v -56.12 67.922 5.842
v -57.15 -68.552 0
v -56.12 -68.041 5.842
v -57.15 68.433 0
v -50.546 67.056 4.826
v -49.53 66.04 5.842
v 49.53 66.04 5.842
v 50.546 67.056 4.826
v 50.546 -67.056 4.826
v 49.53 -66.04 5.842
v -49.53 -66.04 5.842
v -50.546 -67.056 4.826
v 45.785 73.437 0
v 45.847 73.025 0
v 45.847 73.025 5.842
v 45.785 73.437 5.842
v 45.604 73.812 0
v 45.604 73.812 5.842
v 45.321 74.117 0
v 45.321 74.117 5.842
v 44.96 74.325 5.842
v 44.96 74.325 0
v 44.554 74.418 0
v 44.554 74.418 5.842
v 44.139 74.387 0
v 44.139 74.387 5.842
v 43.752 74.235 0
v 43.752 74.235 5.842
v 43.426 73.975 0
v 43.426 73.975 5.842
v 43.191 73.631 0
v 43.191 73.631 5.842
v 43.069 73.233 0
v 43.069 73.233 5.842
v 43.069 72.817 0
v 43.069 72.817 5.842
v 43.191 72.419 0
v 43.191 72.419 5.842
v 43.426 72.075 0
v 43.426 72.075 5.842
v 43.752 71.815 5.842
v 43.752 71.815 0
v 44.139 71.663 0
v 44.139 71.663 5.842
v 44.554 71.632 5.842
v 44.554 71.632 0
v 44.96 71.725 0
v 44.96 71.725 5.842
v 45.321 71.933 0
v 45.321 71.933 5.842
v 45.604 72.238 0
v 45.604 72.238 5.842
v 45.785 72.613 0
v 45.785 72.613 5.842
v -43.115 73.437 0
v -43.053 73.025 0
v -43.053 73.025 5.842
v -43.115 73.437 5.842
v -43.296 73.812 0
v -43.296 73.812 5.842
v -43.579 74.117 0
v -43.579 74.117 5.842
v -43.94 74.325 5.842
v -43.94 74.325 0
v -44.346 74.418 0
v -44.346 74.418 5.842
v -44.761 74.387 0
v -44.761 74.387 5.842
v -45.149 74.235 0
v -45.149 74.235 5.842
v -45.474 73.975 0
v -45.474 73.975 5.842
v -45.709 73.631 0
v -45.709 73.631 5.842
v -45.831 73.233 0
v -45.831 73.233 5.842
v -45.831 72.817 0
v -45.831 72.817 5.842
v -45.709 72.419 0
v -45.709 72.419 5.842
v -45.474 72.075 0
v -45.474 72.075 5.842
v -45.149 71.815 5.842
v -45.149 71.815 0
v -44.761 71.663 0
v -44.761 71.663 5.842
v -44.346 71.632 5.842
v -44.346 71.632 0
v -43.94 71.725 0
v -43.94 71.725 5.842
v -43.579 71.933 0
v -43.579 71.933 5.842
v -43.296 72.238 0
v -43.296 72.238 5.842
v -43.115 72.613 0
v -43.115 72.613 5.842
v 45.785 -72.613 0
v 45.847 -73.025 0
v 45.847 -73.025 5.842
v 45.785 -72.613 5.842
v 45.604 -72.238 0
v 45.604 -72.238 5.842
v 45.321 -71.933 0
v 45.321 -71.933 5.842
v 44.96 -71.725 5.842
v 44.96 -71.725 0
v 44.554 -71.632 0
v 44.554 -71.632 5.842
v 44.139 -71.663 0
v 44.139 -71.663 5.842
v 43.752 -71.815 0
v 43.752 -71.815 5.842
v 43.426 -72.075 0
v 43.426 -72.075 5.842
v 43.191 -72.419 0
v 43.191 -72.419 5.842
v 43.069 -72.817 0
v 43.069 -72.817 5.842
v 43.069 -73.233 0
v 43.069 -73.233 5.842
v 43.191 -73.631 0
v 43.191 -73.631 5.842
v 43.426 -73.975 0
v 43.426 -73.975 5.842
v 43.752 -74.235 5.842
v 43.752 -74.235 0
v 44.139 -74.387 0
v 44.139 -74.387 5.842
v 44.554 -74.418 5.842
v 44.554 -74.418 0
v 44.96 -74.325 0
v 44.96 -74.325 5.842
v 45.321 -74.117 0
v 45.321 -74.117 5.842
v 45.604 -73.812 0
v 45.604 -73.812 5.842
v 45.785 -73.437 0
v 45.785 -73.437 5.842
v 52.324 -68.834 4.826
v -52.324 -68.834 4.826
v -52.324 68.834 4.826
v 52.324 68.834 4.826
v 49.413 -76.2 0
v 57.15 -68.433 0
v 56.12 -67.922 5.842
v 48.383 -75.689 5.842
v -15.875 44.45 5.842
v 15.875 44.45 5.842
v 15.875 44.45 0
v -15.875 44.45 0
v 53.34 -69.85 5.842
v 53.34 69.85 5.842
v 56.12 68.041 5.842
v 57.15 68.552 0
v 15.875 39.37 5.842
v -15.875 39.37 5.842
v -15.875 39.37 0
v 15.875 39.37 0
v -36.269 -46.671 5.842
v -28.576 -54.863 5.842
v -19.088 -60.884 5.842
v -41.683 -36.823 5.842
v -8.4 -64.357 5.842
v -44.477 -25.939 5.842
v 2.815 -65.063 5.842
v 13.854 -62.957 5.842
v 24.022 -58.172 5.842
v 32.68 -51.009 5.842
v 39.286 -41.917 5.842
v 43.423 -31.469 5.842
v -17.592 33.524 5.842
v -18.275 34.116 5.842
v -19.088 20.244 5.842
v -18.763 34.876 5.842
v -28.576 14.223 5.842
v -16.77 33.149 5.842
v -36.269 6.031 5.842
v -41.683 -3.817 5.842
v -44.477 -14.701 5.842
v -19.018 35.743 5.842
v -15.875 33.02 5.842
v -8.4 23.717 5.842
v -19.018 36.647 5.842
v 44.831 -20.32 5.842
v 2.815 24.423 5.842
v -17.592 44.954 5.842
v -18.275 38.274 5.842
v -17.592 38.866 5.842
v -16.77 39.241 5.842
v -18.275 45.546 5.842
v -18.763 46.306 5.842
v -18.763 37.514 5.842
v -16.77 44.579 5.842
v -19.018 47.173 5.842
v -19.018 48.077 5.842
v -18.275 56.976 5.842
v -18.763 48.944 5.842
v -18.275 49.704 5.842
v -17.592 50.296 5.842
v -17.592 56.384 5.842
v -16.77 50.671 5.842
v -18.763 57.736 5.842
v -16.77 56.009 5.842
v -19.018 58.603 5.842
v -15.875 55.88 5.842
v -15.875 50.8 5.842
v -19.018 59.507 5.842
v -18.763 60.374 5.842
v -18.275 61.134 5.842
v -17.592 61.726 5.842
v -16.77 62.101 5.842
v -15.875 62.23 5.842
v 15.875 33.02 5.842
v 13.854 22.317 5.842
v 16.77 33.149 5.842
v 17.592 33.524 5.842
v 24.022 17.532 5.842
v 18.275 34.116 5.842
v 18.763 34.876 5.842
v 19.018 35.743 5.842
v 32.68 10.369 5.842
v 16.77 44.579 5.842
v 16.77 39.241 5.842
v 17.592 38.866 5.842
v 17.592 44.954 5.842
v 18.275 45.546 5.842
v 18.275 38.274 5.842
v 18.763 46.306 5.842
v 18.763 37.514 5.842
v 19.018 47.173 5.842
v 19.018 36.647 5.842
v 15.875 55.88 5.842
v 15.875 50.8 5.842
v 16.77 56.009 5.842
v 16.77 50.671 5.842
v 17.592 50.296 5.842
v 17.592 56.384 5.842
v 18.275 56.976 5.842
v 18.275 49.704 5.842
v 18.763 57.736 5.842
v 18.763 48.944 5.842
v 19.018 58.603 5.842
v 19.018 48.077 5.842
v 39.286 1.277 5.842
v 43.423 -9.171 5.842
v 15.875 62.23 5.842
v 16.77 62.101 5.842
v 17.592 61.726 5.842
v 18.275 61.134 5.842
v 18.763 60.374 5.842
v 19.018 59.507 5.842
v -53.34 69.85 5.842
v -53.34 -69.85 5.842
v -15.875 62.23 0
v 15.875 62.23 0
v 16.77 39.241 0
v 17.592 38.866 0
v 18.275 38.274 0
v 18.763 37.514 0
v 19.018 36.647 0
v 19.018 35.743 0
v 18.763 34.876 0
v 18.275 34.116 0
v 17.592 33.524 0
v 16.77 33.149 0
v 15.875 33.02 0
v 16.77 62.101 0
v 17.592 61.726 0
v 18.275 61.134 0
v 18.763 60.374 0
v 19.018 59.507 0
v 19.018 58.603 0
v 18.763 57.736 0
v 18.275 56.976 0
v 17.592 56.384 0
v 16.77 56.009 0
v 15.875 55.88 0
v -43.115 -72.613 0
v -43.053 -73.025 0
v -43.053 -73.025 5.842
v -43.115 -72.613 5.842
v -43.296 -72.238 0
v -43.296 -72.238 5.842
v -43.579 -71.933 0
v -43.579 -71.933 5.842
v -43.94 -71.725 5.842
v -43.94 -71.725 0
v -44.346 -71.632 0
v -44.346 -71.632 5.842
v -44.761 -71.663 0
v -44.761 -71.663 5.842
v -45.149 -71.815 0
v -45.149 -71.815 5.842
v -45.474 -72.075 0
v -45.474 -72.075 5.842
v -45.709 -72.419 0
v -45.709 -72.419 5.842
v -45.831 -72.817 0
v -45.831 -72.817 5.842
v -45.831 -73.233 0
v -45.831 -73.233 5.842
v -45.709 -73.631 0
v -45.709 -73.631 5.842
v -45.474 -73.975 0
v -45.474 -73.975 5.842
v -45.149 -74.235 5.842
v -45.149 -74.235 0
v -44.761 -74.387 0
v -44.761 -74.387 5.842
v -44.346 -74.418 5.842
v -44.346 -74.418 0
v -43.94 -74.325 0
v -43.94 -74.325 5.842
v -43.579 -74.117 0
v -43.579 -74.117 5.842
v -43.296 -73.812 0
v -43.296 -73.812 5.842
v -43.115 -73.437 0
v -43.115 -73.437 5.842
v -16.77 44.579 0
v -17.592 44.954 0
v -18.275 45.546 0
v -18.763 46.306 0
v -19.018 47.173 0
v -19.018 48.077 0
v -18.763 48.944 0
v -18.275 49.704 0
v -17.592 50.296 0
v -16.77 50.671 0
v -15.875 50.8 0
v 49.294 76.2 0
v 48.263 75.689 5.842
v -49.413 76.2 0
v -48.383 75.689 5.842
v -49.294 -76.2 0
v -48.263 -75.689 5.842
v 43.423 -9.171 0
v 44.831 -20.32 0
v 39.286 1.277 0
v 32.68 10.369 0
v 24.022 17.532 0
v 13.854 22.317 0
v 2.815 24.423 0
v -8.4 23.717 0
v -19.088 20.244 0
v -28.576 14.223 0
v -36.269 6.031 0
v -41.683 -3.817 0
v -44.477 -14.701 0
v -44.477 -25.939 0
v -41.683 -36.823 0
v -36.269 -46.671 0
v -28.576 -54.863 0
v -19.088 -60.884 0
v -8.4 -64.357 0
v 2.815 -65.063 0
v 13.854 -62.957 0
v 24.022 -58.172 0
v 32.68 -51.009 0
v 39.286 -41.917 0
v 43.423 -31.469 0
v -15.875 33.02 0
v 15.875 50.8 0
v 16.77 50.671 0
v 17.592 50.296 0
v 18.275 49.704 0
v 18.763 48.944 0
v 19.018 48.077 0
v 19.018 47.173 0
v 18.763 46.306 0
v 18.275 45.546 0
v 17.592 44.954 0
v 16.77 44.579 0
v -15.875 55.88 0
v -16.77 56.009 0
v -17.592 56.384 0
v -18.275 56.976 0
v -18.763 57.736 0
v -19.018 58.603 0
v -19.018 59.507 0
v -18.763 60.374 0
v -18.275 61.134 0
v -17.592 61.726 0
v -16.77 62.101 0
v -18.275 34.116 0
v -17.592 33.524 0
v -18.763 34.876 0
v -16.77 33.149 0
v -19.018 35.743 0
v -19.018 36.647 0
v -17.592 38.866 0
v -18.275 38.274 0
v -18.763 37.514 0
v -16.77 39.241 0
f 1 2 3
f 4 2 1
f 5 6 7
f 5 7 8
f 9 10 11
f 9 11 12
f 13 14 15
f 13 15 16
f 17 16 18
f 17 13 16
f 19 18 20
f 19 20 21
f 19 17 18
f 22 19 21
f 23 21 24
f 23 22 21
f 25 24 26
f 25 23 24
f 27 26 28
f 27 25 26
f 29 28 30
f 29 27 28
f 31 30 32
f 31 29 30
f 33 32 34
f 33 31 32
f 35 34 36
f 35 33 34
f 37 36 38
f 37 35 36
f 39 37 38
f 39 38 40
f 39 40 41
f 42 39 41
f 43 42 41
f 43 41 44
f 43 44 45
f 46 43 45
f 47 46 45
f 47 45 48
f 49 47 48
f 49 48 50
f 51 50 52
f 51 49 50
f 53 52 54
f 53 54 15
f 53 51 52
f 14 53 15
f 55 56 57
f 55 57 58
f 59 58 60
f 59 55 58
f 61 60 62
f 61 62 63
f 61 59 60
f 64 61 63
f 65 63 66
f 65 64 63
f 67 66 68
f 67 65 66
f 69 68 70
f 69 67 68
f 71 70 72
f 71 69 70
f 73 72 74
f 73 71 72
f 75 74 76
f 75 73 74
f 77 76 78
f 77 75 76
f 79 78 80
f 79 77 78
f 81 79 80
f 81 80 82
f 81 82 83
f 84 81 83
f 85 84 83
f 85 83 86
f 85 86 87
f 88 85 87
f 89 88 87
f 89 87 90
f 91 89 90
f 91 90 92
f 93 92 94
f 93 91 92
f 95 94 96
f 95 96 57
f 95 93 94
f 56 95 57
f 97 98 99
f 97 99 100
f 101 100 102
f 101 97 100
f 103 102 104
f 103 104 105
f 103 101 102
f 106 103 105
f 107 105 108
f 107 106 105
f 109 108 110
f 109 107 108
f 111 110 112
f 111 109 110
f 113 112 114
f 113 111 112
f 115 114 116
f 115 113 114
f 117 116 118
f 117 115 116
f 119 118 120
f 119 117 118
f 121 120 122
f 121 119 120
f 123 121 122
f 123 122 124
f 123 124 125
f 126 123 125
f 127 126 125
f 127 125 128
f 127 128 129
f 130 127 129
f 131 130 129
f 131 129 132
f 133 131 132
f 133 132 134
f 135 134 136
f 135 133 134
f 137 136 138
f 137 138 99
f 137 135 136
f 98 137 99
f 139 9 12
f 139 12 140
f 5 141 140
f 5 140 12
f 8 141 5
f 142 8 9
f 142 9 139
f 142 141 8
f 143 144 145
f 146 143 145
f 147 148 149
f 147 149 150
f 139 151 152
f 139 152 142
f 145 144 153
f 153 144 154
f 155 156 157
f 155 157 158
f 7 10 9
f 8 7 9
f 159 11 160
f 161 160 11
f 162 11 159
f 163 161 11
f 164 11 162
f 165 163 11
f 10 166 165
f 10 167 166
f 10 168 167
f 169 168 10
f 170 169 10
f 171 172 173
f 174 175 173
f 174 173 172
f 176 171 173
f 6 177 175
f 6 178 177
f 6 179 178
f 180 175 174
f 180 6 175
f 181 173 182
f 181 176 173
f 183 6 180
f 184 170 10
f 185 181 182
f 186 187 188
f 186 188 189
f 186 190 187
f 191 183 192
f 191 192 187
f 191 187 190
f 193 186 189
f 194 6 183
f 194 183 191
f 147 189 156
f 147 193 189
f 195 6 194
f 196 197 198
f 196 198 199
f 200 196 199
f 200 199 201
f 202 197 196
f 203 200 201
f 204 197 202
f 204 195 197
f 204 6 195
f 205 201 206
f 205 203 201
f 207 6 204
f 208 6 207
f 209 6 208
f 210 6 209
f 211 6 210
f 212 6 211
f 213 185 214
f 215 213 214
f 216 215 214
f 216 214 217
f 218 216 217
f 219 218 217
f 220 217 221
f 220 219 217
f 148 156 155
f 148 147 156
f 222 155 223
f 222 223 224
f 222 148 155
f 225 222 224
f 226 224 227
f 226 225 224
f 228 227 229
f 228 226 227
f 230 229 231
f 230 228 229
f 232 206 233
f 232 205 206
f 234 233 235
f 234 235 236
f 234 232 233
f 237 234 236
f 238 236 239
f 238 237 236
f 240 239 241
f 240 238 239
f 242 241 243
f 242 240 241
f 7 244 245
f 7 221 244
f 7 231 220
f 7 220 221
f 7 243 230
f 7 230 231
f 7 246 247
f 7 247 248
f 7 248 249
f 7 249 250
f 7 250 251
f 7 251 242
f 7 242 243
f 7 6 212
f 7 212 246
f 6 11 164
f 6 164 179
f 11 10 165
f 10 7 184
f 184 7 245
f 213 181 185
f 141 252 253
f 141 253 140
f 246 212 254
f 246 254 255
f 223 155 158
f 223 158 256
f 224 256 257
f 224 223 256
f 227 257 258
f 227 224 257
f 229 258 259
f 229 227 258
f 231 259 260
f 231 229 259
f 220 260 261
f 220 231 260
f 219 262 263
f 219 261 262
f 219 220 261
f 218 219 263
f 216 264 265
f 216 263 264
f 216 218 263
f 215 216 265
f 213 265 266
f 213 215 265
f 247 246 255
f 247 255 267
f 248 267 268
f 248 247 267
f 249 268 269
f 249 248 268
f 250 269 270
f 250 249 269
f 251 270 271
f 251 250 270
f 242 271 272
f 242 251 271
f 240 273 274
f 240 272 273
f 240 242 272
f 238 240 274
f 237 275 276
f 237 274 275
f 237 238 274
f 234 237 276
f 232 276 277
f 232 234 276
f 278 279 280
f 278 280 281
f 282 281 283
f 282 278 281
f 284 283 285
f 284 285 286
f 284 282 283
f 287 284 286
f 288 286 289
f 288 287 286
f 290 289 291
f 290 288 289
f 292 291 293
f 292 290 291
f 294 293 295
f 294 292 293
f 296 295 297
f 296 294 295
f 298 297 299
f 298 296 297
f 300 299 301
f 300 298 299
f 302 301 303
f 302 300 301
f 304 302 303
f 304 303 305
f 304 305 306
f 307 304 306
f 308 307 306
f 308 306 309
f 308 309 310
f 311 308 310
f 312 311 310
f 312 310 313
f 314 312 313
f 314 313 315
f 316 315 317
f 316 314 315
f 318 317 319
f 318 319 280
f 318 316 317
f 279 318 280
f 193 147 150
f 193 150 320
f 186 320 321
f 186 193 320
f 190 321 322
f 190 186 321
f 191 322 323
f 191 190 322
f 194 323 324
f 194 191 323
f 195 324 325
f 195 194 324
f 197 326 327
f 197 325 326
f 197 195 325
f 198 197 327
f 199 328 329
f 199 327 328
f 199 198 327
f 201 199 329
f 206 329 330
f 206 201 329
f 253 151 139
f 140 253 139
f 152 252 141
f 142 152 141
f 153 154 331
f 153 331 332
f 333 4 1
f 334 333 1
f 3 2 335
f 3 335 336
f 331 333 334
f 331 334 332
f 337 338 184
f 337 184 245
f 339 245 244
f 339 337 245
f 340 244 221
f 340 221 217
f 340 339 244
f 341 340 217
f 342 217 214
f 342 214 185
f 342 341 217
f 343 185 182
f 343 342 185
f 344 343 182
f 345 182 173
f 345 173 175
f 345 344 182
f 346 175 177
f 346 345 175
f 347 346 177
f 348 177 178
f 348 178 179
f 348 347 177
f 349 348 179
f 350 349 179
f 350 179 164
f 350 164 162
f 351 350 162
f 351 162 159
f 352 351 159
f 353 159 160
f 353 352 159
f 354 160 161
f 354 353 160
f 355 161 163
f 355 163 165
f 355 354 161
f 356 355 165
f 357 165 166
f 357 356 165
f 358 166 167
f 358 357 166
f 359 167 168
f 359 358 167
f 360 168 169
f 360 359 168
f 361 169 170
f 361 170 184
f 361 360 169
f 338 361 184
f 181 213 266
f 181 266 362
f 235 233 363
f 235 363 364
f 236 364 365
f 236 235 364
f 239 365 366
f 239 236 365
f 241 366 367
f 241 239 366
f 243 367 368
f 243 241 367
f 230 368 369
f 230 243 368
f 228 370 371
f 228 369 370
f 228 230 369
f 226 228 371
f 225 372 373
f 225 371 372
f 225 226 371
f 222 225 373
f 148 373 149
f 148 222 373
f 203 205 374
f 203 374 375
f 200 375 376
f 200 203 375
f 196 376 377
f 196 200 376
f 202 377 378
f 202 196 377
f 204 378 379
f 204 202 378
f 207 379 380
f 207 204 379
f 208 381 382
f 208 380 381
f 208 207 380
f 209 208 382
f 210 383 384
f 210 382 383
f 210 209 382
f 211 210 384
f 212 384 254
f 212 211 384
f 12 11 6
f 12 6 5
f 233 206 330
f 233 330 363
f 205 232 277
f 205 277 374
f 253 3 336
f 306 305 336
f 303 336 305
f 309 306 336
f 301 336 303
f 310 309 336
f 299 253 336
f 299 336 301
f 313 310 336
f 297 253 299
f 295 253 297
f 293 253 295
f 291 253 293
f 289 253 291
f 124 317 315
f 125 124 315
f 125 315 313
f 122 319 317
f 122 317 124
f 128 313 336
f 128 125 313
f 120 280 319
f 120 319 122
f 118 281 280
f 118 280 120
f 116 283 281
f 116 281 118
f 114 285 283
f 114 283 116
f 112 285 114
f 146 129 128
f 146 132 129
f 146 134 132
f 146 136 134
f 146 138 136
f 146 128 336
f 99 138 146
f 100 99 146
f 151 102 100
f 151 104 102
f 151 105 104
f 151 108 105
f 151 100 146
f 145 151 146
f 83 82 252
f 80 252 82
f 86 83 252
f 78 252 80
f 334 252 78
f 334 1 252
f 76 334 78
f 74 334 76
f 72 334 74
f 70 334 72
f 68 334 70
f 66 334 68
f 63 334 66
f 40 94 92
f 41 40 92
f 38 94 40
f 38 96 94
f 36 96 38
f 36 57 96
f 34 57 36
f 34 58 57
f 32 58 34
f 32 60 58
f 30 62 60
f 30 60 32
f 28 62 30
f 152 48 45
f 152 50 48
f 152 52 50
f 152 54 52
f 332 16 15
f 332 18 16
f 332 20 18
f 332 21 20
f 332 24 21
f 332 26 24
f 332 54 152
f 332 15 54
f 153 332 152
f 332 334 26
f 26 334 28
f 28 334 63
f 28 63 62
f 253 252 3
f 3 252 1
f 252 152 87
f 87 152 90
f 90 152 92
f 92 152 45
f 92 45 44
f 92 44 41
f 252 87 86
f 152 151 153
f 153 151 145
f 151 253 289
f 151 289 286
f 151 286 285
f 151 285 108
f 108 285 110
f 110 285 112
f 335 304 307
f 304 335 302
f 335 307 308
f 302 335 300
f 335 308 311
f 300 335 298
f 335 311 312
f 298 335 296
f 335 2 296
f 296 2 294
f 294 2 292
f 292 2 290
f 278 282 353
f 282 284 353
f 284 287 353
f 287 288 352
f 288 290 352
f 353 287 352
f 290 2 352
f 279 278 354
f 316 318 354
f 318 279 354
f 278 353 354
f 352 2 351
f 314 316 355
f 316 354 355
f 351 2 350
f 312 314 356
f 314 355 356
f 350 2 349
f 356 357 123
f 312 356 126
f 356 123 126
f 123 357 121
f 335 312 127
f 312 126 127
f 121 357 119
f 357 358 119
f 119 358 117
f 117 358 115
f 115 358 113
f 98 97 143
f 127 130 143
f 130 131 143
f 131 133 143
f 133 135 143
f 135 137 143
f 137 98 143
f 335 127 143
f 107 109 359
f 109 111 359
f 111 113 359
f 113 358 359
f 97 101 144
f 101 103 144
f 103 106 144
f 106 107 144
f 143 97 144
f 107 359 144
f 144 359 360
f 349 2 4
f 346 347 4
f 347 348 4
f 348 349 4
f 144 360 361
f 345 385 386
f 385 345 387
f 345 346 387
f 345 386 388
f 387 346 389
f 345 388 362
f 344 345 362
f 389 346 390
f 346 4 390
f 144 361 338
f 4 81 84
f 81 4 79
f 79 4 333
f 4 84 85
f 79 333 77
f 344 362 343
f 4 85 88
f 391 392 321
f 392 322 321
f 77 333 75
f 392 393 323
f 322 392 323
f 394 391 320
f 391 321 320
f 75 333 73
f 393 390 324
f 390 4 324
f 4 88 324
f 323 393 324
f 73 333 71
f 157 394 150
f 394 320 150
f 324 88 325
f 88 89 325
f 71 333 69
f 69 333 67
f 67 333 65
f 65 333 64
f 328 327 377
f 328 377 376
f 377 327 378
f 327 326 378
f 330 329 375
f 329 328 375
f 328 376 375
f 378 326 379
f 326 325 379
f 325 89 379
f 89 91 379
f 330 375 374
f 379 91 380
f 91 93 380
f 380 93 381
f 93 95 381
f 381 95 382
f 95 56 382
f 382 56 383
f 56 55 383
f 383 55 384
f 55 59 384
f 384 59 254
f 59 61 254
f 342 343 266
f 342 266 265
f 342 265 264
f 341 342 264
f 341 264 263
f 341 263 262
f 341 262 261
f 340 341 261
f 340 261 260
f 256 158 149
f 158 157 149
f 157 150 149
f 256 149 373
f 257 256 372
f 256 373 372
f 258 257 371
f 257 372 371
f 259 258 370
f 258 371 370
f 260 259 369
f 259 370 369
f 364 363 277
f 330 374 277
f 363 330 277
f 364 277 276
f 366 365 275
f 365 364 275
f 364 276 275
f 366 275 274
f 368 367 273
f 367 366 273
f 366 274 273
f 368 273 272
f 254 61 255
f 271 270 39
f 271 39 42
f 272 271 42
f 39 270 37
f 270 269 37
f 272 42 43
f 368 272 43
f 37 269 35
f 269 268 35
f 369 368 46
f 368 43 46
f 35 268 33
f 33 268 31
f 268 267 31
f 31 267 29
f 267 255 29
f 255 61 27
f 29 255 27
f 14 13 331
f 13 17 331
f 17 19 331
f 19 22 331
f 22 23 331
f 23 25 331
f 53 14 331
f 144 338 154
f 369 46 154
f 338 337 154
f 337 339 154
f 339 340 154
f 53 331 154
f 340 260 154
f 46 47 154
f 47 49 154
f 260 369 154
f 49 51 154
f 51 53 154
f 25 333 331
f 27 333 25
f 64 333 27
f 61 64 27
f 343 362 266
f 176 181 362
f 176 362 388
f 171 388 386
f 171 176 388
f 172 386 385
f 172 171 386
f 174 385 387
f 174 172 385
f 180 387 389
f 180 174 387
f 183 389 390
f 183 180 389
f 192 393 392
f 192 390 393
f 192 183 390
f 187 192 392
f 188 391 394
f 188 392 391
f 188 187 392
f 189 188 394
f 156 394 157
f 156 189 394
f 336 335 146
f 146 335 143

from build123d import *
from OCP.BRepFilletAPI import BRepFilletAPI_MakeChamfer

# Parameters (mm, degrees)
SKETCH1_W               = 114.3
SKETCH1_H               = 152.4
SKETCH1_R               = 44.831
SKETCH1_R_2             = 1.397
BOSS_EXTRUDE1_DEPTH     = 5.842
DRAFT1_ANGLE            = -5
DRAFT2_ANGLE            = -10
SKETCH2_W               = 104.14
SKETCH2_H               = 137.16
SKETCH2_W_2             = 101.6
SKETCH2_H_2             = 134.62
CUT_EXTRUDE_THIN1_DEPTH = 1.016
CHAMFER2_SIZE           = 7.62
CHAMFER2_SIZE2          = 7.737996461
CUT_EXTRUDE1_DEPTH      = 7.62


with BuildPart() as part:
    # Sketch1 → Boss-Extrude1 (new body)
    with BuildSketch(Plane.XY):
        Rectangle(SKETCH1_W, SKETCH1_H)
        with Locations((0, -20.32)):
            Circle(SKETCH1_R, mode=Mode.SUBTRACT)
        with Locations((-44.45, 73.025)):
            Circle(SKETCH1_R_2, mode=Mode.SUBTRACT)
        with Locations((44.45, 73.025)):
            Circle(SKETCH1_R_2, mode=Mode.SUBTRACT)
        with Locations((44.45, -73.025)):
            Circle(SKETCH1_R_2, mode=Mode.SUBTRACT)
        with Locations((-44.45, -73.025)):
            Circle(SKETCH1_R_2, mode=Mode.SUBTRACT)
    extrude(amount=BOSS_EXTRUDE1_DEPTH)

    # Draft1
    draft1_faces = [part.faces().sort_by_distance(p)[0] for p in [
        (0, 76.2, 2.921),
        (0, -76.2, 2.921),
    ]]
    draft(draft1_faces, Plane(origin=(0, 0, 0), x_dir=(-1, 0, 0), z_dir=(0, 0, -1)), DRAFT1_ANGLE)

    # Draft2
    draft2_faces = [part.faces().sort_by_distance(p)[0] for p in [
        (57.15, 0, 2.917723595),
        (-57.15, 0, 2.917723595),
    ]]
    draft(draft2_faces, Plane(origin=(0, 0, 0), x_dir=(-1, 0, 0), z_dir=(0, 0, -1)), DRAFT2_ANGLE)

    # Sketch2 → Cut-Extrude-Thin1 (cut)
    with BuildSketch(Plane.XY.offset(5.842)):
        Rectangle(SKETCH2_W, SKETCH2_H)
        Rectangle(SKETCH2_W_2, SKETCH2_H_2, mode=Mode.SUBTRACT)
    extrude(amount=-CUT_EXTRUDE_THIN1_DEPTH, mode=Mode.SUBTRACT)

    # Chamfer1
    # the kernel refuses this chamfer: 1.27 mm, written as the material it takes off along each edge
    with BuildSketch(Plane(origin=(50.8, 67.31, 5.842), x_dir=(-0.9996219169112968, 0, 0.02749587661058659), z_dir=(0, -1, 0))) as chamfer1_piece_1_section:
        with BuildLine():
            Line((1.306414958, 0), (-0.071814887, 1.304439598))
            Line((-0.071814887, 1.304439598), (-0.097205283, 1.303741203))
            ThreePointArc((-0.097205283, 1.303741203), (-0.043344118, 0.652015244), (-0.025390397, -0.000698395))
            Line((-0.025390397, -0.000698395), (0.000698395, -0.025390397))
            ThreePointArc((0.000698395, -0.025390397), (0.653412034, -0.007436675), (1.307113353, -0.025390397))
            Line((1.307113353, -0.025390397), (1.306414958, 0))
        make_face()
    chamfer1_piece_1 = extrude(amount=134.62, mode=Mode.PRIVATE)
    chamfer1_piece_1 = split(chamfer1_piece_1, bisect_by=Plane(origin=(50.360937616, 0, 4.826), z_dir=(0, 0, 1)), keep=Keep.TOP, mode=Mode.PRIVATE)
    add(chamfer1_piece_1, mode=Mode.SUBTRACT)
    with BuildSketch(Plane(origin=(50.8, -67.31, 5.842), x_dir=(0, 0.9996219169112968, 0.02749587661058659), z_dir=(-1, 0, 0))) as chamfer1_piece_2_section:
        with BuildLine():
            Line((1.306414958, 0), (-0.071814887, 1.304439598))
            Line((-0.071814887, 1.304439598), (-0.097205283, 1.303741203))
            ThreePointArc((-0.097205283, 1.303741203), (-0.043344118, 0.652015244), (-0.025390397, -0.000698395))
            Line((-0.025390397, -0.000698395), (0.000698395, -0.025390397))
            ThreePointArc((0.000698395, -0.025390397), (0.653412034, -0.007436675), (1.307113353, -0.025390397))
            Line((1.307113353, -0.025390397), (1.306414958, 0))
        make_face()
    chamfer1_piece_2 = extrude(amount=101.6, mode=Mode.PRIVATE)
    chamfer1_piece_2 = split(chamfer1_piece_2, bisect_by=Plane(origin=(0, -66.870937616, 4.826), z_dir=(0, 0, 1)), keep=Keep.TOP, mode=Mode.PRIVATE)
    add(chamfer1_piece_2, mode=Mode.SUBTRACT)
    with BuildSketch(Plane(origin=(-50.8, -67.31, 5.842), x_dir=(0.9996219169112968, 0, 0.02749587661058659), z_dir=(0, 1, 0))) as chamfer1_piece_3_section:
        with BuildLine():
            Line((1.306414958, 0), (-0.071814887, 1.304439598))
            Line((-0.071814887, 1.304439598), (-0.097205283, 1.303741203))
            ThreePointArc((-0.097205283, 1.303741203), (-0.043344118, 0.652015244), (-0.025390397, -0.000698395))
            Line((-0.025390397, -0.000698395), (0.000698395, -0.025390397))
            ThreePointArc((0.000698395, -0.025390397), (0.653412034, -0.007436675), (1.307113353, -0.025390397))
            Line((1.307113353, -0.025390397), (1.306414958, 0))
        make_face()
    chamfer1_piece_3 = extrude(amount=134.62, mode=Mode.PRIVATE)
    chamfer1_piece_3 = split(chamfer1_piece_3, bisect_by=Plane(origin=(-50.360937616, 0, 4.826), z_dir=(0, 0, 1)), keep=Keep.TOP, mode=Mode.PRIVATE)
    add(chamfer1_piece_3, mode=Mode.SUBTRACT)
    with BuildSketch(Plane(origin=(-50.8, 67.31, 5.842), x_dir=(0, -0.9996219169112968, 0.02749587661058659), z_dir=(1, 0, 0))) as chamfer1_piece_4_section:
        with BuildLine():
            Line((1.306414958, 0), (-0.071814887, 1.304439598))
            Line((-0.071814887, 1.304439598), (-0.097205283, 1.303741203))
            ThreePointArc((-0.097205283, 1.303741203), (-0.043344118, 0.652015244), (-0.025390397, -0.000698395))
            Line((-0.025390397, -0.000698395), (0.000698395, -0.025390397))
            ThreePointArc((0.000698395, -0.025390397), (0.653412034, -0.007436675), (1.307113353, -0.025390397))
            Line((1.307113353, -0.025390397), (1.306414958, 0))
        make_face()
    chamfer1_piece_4 = extrude(amount=101.6, mode=Mode.PRIVATE)
    chamfer1_piece_4 = split(chamfer1_piece_4, bisect_by=Plane(origin=(0, 66.870937616, 4.826), z_dir=(0, 0, 1)), keep=Keep.TOP, mode=Mode.PRIVATE)
    add(chamfer1_piece_4, mode=Mode.SUBTRACT)
    with BuildSketch(Plane(origin=(-52.07, 68.58, 5.842), x_dir=(0, 0.9996219169112968, 0.02749587661058659), z_dir=(1, 0, 0))) as chamfer1_piece_5_section:
        with BuildLine():
            Line((1.306414958, 0), (-0.071814887, -1.304439598))
            Line((-0.071814887, -1.304439598), (-0.097205283, -1.303741203))
            ThreePointArc((-0.097205283, -1.303741203), (-0.043344118, -0.652015244), (-0.025390397, 0.000698395))
            Line((-0.025390397, 0.000698395), (0.000698395, 0.025390397))
            ThreePointArc((0.000698395, 0.025390397), (0.653412034, 0.007436675), (1.307113353, 0.025390397))
            Line((1.307113353, 0.025390397), (1.306414958, 0))
        make_face()
    chamfer1_piece_5 = extrude(amount=104.14, mode=Mode.PRIVATE)
    chamfer1_piece_5 = split(chamfer1_piece_5, bisect_by=Plane(origin=(0, 69.019062384, 4.826), z_dir=(0, 0, 1)), keep=Keep.TOP, mode=Mode.PRIVATE)
    add(chamfer1_piece_5, mode=Mode.SUBTRACT)
    with BuildSketch(Plane(origin=(52.07, 68.58, 5.842), x_dir=(0.9996219169112968, 0, 0.02749587661058659), z_dir=(0, -1, 0))) as chamfer1_piece_6_section:
        with BuildLine():
            Line((1.306414958, 0), (-0.071814887, -1.304439598))
            Line((-0.071814887, -1.304439598), (-0.097205283, -1.303741203))
            ThreePointArc((-0.097205283, -1.303741203), (-0.043344118, -0.652015244), (-0.025390397, 0.000698395))
            Line((-0.025390397, 0.000698395), (0.000698395, 0.025390397))
            ThreePointArc((0.000698395, 0.025390397), (0.653412034, 0.007436675), (1.307113353, 0.025390397))
            Line((1.307113353, 0.025390397), (1.306414958, 0))
        make_face()
    chamfer1_piece_6 = extrude(amount=137.16, mode=Mode.PRIVATE)
    chamfer1_piece_6 = split(chamfer1_piece_6, bisect_by=Plane(origin=(52.509062384, 0, 4.826), z_dir=(0, 0, 1)), keep=Keep.TOP, mode=Mode.PRIVATE)
    add(chamfer1_piece_6, mode=Mode.SUBTRACT)
    with BuildSketch(Plane(origin=(-52.07, -68.58, 5.842), x_dir=(-0.9996219169112968, 0, 0.02749587661058659), z_dir=(0, 1, 0))) as chamfer1_piece_7_section:
        with BuildLine():
            Line((1.306414958, 0), (-0.071814887, -1.304439598))
            Line((-0.071814887, -1.304439598), (-0.097205283, -1.303741203))
            ThreePointArc((-0.097205283, -1.303741203), (-0.043344118, -0.652015244), (-0.025390397, 0.000698395))
            Line((-0.025390397, 0.000698395), (0.000698395, 0.025390397))
            ThreePointArc((0.000698395, 0.025390397), (0.653412034, 0.007436675), (1.307113353, 0.025390397))
            Line((1.307113353, 0.025390397), (1.306414958, 0))
        make_face()
    chamfer1_piece_7 = extrude(amount=137.16, mode=Mode.PRIVATE)
    chamfer1_piece_7 = split(chamfer1_piece_7, bisect_by=Plane(origin=(-52.509062384, 0, 4.826), z_dir=(0, 0, 1)), keep=Keep.TOP, mode=Mode.PRIVATE)
    add(chamfer1_piece_7, mode=Mode.SUBTRACT)
    with BuildSketch(Plane(origin=(52.07, -68.58, 5.842), x_dir=(0, -0.9996219169112968, 0.02749587661058659), z_dir=(-1, 0, 0))) as chamfer1_piece_8_section:
        with BuildLine():
            Line((1.306414958, 0), (-0.071814887, -1.304439598))
            Line((-0.071814887, -1.304439598), (-0.097205283, -1.303741203))
            ThreePointArc((-0.097205283, -1.303741203), (-0.043344118, -0.652015244), (-0.025390397, 0.000698395))
            Line((-0.025390397, 0.000698395), (0.000698395, 0.025390397))
            ThreePointArc((0.000698395, 0.025390397), (0.653412034, 0.007436675), (1.307113353, 0.025390397))
            Line((1.307113353, 0.025390397), (1.306414958, 0))
        make_face()
    chamfer1_piece_8 = extrude(amount=104.14, mode=Mode.PRIVATE)
    chamfer1_piece_8 = split(chamfer1_piece_8, bisect_by=Plane(origin=(0, -69.019062384, 4.826), z_dir=(0, 0, 1)), keep=Keep.TOP, mode=Mode.PRIVATE)
    add(chamfer1_piece_8, mode=Mode.SUBTRACT)
    with BuildSketch(Plane(origin=(50.8, 70.576037395, 5.842), x_dir=(-0.9996219169112968, 0, 0.02749587661058659), z_dir=(0, -1, 0))) as chamfer1_piece_9a_section:
        with BuildLine():
            Line((1.306414958, 0), (-0.071814887, 1.304439598))
            Line((-0.071814887, 1.304439598), (-0.097205283, 1.303741203))
            ThreePointArc((-0.097205283, 1.303741203), (-0.043344118, 0.652015244), (-0.025390397, -0.000698395))
            Line((-0.025390397, -0.000698395), (0.000698395, -0.025390397))
            ThreePointArc((0.000698395, -0.025390397), (0.653412034, -0.007436675), (1.307113353, -0.025390397))
            Line((1.307113353, -0.025390397), (1.306414958, 0))
        make_face()
    chamfer1_piece_9a = extrude(amount=137.886037395, mode=Mode.PRIVATE)
    chamfer1_piece_9a = split(chamfer1_piece_9a, bisect_by=Plane(origin=(50.360937616, 68.943018697, 4.826), z_dir=(0, 0, 1)), keep=Keep.TOP, mode=Mode.PRIVATE)
    chamfer1_piece_9a = split(chamfer1_piece_9a, bisect_by=Plane(origin=(50.360937616, 67.31, 5.461731684), z_dir=(0, 1, 0)), keep=Keep.TOP, mode=Mode.PRIVATE)
    with BuildSketch(Plane(origin=(-50.8, 67.31, 5.842), x_dir=(0, -0.9996219169112968, 0.02749587661058659), z_dir=(1, 0, 0))) as chamfer1_piece_9b_section:
        with BuildLine():
            Line((1.306414958, 0), (-0.071814887, 1.304439598))
            Line((-0.071814887, 1.304439598), (-0.097205283, 1.303741203))
            ThreePointArc((-0.097205283, 1.303741203), (-0.043344118, 0.652015244), (-0.025390397, -0.000698395))
            Line((-0.025390397, -0.000698395), (0.000698395, -0.025390397))
            ThreePointArc((0.000698395, -0.025390397), (0.653412034, -0.007436675), (1.307113353, -0.025390397))
            Line((1.307113353, -0.025390397), (1.306414958, 0))
        make_face()
    chamfer1_piece_9b = extrude(amount=104.866037395, mode=Mode.PRIVATE)
    chamfer1_piece_9b = split(chamfer1_piece_9b, bisect_by=Plane(origin=(52.433018697, 66.870937616, 4.826), z_dir=(0, 0, 1)), keep=Keep.TOP, mode=Mode.PRIVATE)
    chamfer1_piece_9b = split(chamfer1_piece_9b, bisect_by=Plane(origin=(50.8, 66.870937616, 5.461731684), z_dir=(1, 0, 0)), keep=Keep.TOP, mode=Mode.PRIVATE)
    chamfer1_piece_9 = chamfer1_piece_9a & chamfer1_piece_9b
    add(chamfer1_piece_9, mode=Mode.SUBTRACT)
    with BuildSketch(Plane(origin=(54.066037395, -67.31, 5.842), x_dir=(0, 0.9996219169112968, 0.02749587661058659), z_dir=(-1, 0, 0))) as chamfer1_piece_10a_section:
        with BuildLine():
            Line((1.306414958, 0), (-0.071814887, 1.304439598))
            Line((-0.071814887, 1.304439598), (-0.097205283, 1.303741203))
            ThreePointArc((-0.097205283, 1.303741203), (-0.043344118, 0.652015244), (-0.025390397, -0.000698395))
            Line((-0.025390397, -0.000698395), (0.000698395, -0.025390397))
            ThreePointArc((0.000698395, -0.025390397), (0.653412034, -0.007436675), (1.307113353, -0.025390397))
            Line((1.307113353, -0.025390397), (1.306414958, 0))
        make_face()
    chamfer1_piece_10a = extrude(amount=104.866037395, mode=Mode.PRIVATE)
    chamfer1_piece_10a = split(chamfer1_piece_10a, bisect_by=Plane(origin=(52.433018697, -66.870937616, 4.826), z_dir=(0, 0, 1)), keep=Keep.TOP, mode=Mode.PRIVATE)
    chamfer1_piece_10a = split(chamfer1_piece_10a, bisect_by=Plane(origin=(50.8, -66.870937616, 5.461731684), z_dir=(1, 0, 0)), keep=Keep.TOP, mode=Mode.PRIVATE)
    with BuildSketch(Plane(origin=(50.8, 67.31, 5.842), x_dir=(-0.9996219169112968, 0, 0.02749587661058659), z_dir=(0, -1, 0))) as chamfer1_piece_10b_section:
        with BuildLine():
            Line((1.306414958, 0), (-0.071814887, 1.304439598))
            Line((-0.071814887, 1.304439598), (-0.097205283, 1.303741203))
            ThreePointArc((-0.097205283, 1.303741203), (-0.043344118, 0.652015244), (-0.025390397, -0.000698395))
            Line((-0.025390397, -0.000698395), (0.000698395, -0.025390397))
            ThreePointArc((0.000698395, -0.025390397), (0.653412034, -0.007436675), (1.307113353, -0.025390397))
            Line((1.307113353, -0.025390397), (1.306414958, 0))
        make_face()
    chamfer1_piece_10b = extrude(amount=137.886037395, mode=Mode.PRIVATE)
    chamfer1_piece_10b = split(chamfer1_piece_10b, bisect_by=Plane(origin=(50.360937616, -68.943018697, 4.826), z_dir=(0, 0, 1)), keep=Keep.TOP, mode=Mode.PRIVATE)
    chamfer1_piece_10b = split(chamfer1_piece_10b, bisect_by=Plane(origin=(50.360937616, -67.31, 5.461731684), z_dir=(0, -1, 0)), keep=Keep.TOP, mode=Mode.PRIVATE)
    chamfer1_piece_10 = chamfer1_piece_10a & chamfer1_piece_10b
    add(chamfer1_piece_10, mode=Mode.SUBTRACT)
    with BuildSketch(Plane(origin=(50.8, -67.31, 5.842), x_dir=(0, 0.9996219169112968, 0.02749587661058659), z_dir=(-1, 0, 0))) as chamfer1_piece_11a_section:
        with BuildLine():
            Line((1.306414958, 0), (-0.071814887, 1.304439598))
            Line((-0.071814887, 1.304439598), (-0.097205283, 1.303741203))
            ThreePointArc((-0.097205283, 1.303741203), (-0.043344118, 0.652015244), (-0.025390397, -0.000698395))
            Line((-0.025390397, -0.000698395), (0.000698395, -0.025390397))
            ThreePointArc((0.000698395, -0.025390397), (0.653412034, -0.007436675), (1.307113353, -0.025390397))
            Line((1.307113353, -0.025390397), (1.306414958, 0))
        make_face()
    chamfer1_piece_11a = extrude(amount=104.866037395, mode=Mode.PRIVATE)
    chamfer1_piece_11a = split(chamfer1_piece_11a, bisect_by=Plane(origin=(-52.433018697, -66.870937616, 4.826), z_dir=(0, 0, 1)), keep=Keep.TOP, mode=Mode.PRIVATE)
    chamfer1_piece_11a = split(chamfer1_piece_11a, bisect_by=Plane(origin=(-50.8, -66.870937616, 5.461731684), z_dir=(-1, 0, 0)), keep=Keep.TOP, mode=Mode.PRIVATE)
    with BuildSketch(Plane(origin=(-50.8, -70.576037395, 5.842), x_dir=(0.9996219169112968, 0, 0.02749587661058659), z_dir=(0, 1, 0))) as chamfer1_piece_11b_section:
        with BuildLine():
            Line((1.306414958, 0), (-0.071814887, 1.304439598))
            Line((-0.071814887, 1.304439598), (-0.097205283, 1.303741203))
            ThreePointArc((-0.097205283, 1.303741203), (-0.043344118, 0.652015244), (-0.025390397, -0.000698395))
            Line((-0.025390397, -0.000698395), (0.000698395, -0.025390397))
            ThreePointArc((0.000698395, -0.025390397), (0.653412034, -0.007436675), (1.307113353, -0.025390397))
            Line((1.307113353, -0.025390397), (1.306414958, 0))
        make_face()
    chamfer1_piece_11b = extrude(amount=137.886037395, mode=Mode.PRIVATE)
    chamfer1_piece_11b = split(chamfer1_piece_11b, bisect_by=Plane(origin=(-50.360937616, -68.943018697, 4.826), z_dir=(0, 0, 1)), keep=Keep.TOP, mode=Mode.PRIVATE)
    chamfer1_piece_11b = split(chamfer1_piece_11b, bisect_by=Plane(origin=(-50.360937616, -67.31, 5.461731684), z_dir=(0, -1, 0)), keep=Keep.TOP, mode=Mode.PRIVATE)
    chamfer1_piece_11 = chamfer1_piece_11a & chamfer1_piece_11b
    add(chamfer1_piece_11, mode=Mode.SUBTRACT)
    with BuildSketch(Plane(origin=(-54.066037395, 67.31, 5.842), x_dir=(0, -0.9996219169112968, 0.02749587661058659), z_dir=(1, 0, 0))) as chamfer1_piece_12a_section:
        with BuildLine():
            Line((1.306414958, 0), (-0.071814887, 1.304439598))
            Line((-0.071814887, 1.304439598), (-0.097205283, 1.303741203))
            ThreePointArc((-0.097205283, 1.303741203), (-0.043344118, 0.652015244), (-0.025390397, -0.000698395))
            Line((-0.025390397, -0.000698395), (0.000698395, -0.025390397))
            ThreePointArc((0.000698395, -0.025390397), (0.653412034, -0.007436675), (1.307113353, -0.025390397))
            Line((1.307113353, -0.025390397), (1.306414958, 0))
        make_face()
    chamfer1_piece_12a = extrude(amount=104.866037395, mode=Mode.PRIVATE)
    chamfer1_piece_12a = split(chamfer1_piece_12a, bisect_by=Plane(origin=(-52.433018697, 66.870937616, 4.826), z_dir=(0, 0, 1)), keep=Keep.TOP, mode=Mode.PRIVATE)
    chamfer1_piece_12a = split(chamfer1_piece_12a, bisect_by=Plane(origin=(-50.8, 66.870937616, 5.461731684), z_dir=(-1, 0, 0)), keep=Keep.TOP, mode=Mode.PRIVATE)
    with BuildSketch(Plane(origin=(-50.8, -67.31, 5.842), x_dir=(0.9996219169112968, 0, 0.02749587661058659), z_dir=(0, 1, 0))) as chamfer1_piece_12b_section:
        with BuildLine():
            Line((1.306414958, 0), (-0.071814887, 1.304439598))
            Line((-0.071814887, 1.304439598), (-0.097205283, 1.303741203))
            ThreePointArc((-0.097205283, 1.303741203), (-0.043344118, 0.652015244), (-0.025390397, -0.000698395))
            Line((-0.025390397, -0.000698395), (0.000698395, -0.025390397))
            ThreePointArc((0.000698395, -0.025390397), (0.653412034, -0.007436675), (1.307113353, -0.025390397))
            Line((1.307113353, -0.025390397), (1.306414958, 0))
        make_face()
    chamfer1_piece_12b = extrude(amount=137.886037395, mode=Mode.PRIVATE)
    chamfer1_piece_12b = split(chamfer1_piece_12b, bisect_by=Plane(origin=(-50.360937616, 68.943018697, 4.826), z_dir=(0, 0, 1)), keep=Keep.TOP, mode=Mode.PRIVATE)
    chamfer1_piece_12b = split(chamfer1_piece_12b, bisect_by=Plane(origin=(-50.360937616, 67.31, 5.461731684), z_dir=(0, 1, 0)), keep=Keep.TOP, mode=Mode.PRIVATE)
    chamfer1_piece_12 = chamfer1_piece_12a & chamfer1_piece_12b
    add(chamfer1_piece_12, mode=Mode.SUBTRACT)
    with BuildSketch(Plane(origin=(-55.336037395, 68.58, 5.842), x_dir=(0, 0.9996219169112968, 0.02749587661058659), z_dir=(1, 0, 0))) as chamfer1_piece_13a_section:
        with BuildLine():
            Line((1.306414958, 0), (-0.071814887, -1.304439598))
            Line((-0.071814887, -1.304439598), (-0.097205283, -1.303741203))
            ThreePointArc((-0.097205283, -1.303741203), (-0.043344118, -0.652015244), (-0.025390397, 0.000698395))
            Line((-0.025390397, 0.000698395), (0.000698395, 0.025390397))
            ThreePointArc((0.000698395, 0.025390397), (0.653412034, 0.007436675), (1.307113353, 0.025390397))
            Line((1.307113353, 0.025390397), (1.306414958, 0))
        make_face()
    chamfer1_piece_13a = extrude(amount=107.406037395, mode=Mode.PRIVATE)
    chamfer1_piece_13a = split(chamfer1_piece_13a, bisect_by=Plane(origin=(-52.07, 69.019062384, 5.461731684), z_dir=(-1, 0, 0)), keep=Keep.TOP, mode=Mode.PRIVATE)
    chamfer1_piece_13a = split(chamfer1_piece_13a, bisect_by=Plane(origin=(-53.703018697, 69.019062384, 4.826), z_dir=(0, 0, 1)), keep=Keep.TOP, mode=Mode.PRIVATE)
    with BuildSketch(Plane(origin=(-52.07, -68.58, 5.842), x_dir=(-0.9996219169112968, 0, 0.02749587661058659), z_dir=(0, 1, 0))) as chamfer1_piece_13b_section:
        with BuildLine():
            Line((1.306414958, 0), (-0.071814887, -1.304439598))
            Line((-0.071814887, -1.304439598), (-0.097205283, -1.303741203))
            ThreePointArc((-0.097205283, -1.303741203), (-0.043344118, -0.652015244), (-0.025390397, 0.000698395))
            Line((-0.025390397, 0.000698395), (0.000698395, 0.025390397))
            ThreePointArc((0.000698395, 0.025390397), (0.653412034, 0.007436675), (1.307113353, 0.025390397))
            Line((1.307113353, 0.025390397), (1.306414958, 0))
        make_face()
    chamfer1_piece_13b = extrude(amount=140.426037395, mode=Mode.PRIVATE)
    chamfer1_piece_13b = split(chamfer1_piece_13b, bisect_by=Plane(origin=(-52.509062384, 68.58, 5.461731684), z_dir=(0, 1, 0)), keep=Keep.TOP, mode=Mode.PRIVATE)
    chamfer1_piece_13b = split(chamfer1_piece_13b, bisect_by=Plane(origin=(-52.509062384, 70.213018697, 4.826), z_dir=(0, 0, 1)), keep=Keep.TOP, mode=Mode.PRIVATE)
    chamfer1_piece_13 = chamfer1_piece_13a & chamfer1_piece_13b
    add(chamfer1_piece_13, mode=Mode.SUBTRACT)
    with BuildSketch(Plane(origin=(-52.07, 68.58, 5.842), x_dir=(0, 0.9996219169112968, 0.02749587661058659), z_dir=(1, 0, 0))) as chamfer1_piece_14a_section:
        with BuildLine():
            Line((1.306414958, 0), (-0.071814887, -1.304439598))
            Line((-0.071814887, -1.304439598), (-0.097205283, -1.303741203))
            ThreePointArc((-0.097205283, -1.303741203), (-0.043344118, -0.652015244), (-0.025390397, 0.000698395))
            Line((-0.025390397, 0.000698395), (0.000698395, 0.025390397))
            ThreePointArc((0.000698395, 0.025390397), (0.653412034, 0.007436675), (1.307113353, 0.025390397))
            Line((1.307113353, 0.025390397), (1.306414958, 0))
        make_face()
    chamfer1_piece_14a = extrude(amount=107.406037395, mode=Mode.PRIVATE)
    chamfer1_piece_14a = split(chamfer1_piece_14a, bisect_by=Plane(origin=(52.07, 69.019062384, 5.461731684), z_dir=(1, 0, 0)), keep=Keep.TOP, mode=Mode.PRIVATE)
    chamfer1_piece_14a = split(chamfer1_piece_14a, bisect_by=Plane(origin=(53.703018697, 69.019062384, 4.826), z_dir=(0, 0, 1)), keep=Keep.TOP, mode=Mode.PRIVATE)
    with BuildSketch(Plane(origin=(52.07, 71.846037395, 5.842), x_dir=(0.9996219169112968, 0, 0.02749587661058659), z_dir=(0, -1, 0))) as chamfer1_piece_14b_section:
        with BuildLine():
            Line((1.306414958, 0), (-0.071814887, -1.304439598))
            Line((-0.071814887, -1.304439598), (-0.097205283, -1.303741203))
            ThreePointArc((-0.097205283, -1.303741203), (-0.043344118, -0.652015244), (-0.025390397, 0.000698395))
            Line((-0.025390397, 0.000698395), (0.000698395, 0.025390397))
            ThreePointArc((0.000698395, 0.025390397), (0.653412034, 0.007436675), (1.307113353, 0.025390397))
            Line((1.307113353, 0.025390397), (1.306414958, 0))
        make_face()
    chamfer1_piece_14b = extrude(amount=140.426037395, mode=Mode.PRIVATE)
    chamfer1_piece_14b = split(chamfer1_piece_14b, bisect_by=Plane(origin=(52.509062384, 68.58, 5.461731684), z_dir=(0, 1, 0)), keep=Keep.TOP, mode=Mode.PRIVATE)
    chamfer1_piece_14b = split(chamfer1_piece_14b, bisect_by=Plane(origin=(52.509062384, 70.213018697, 4.826), z_dir=(0, 0, 1)), keep=Keep.TOP, mode=Mode.PRIVATE)
    chamfer1_piece_14 = chamfer1_piece_14a & chamfer1_piece_14b
    add(chamfer1_piece_14, mode=Mode.SUBTRACT)
    with BuildSketch(Plane(origin=(52.07, 68.58, 5.842), x_dir=(0.9996219169112968, 0, 0.02749587661058659), z_dir=(0, -1, 0))) as chamfer1_piece_15a_section:
        with BuildLine():
            Line((1.306414958, 0), (-0.071814887, -1.304439598))
            Line((-0.071814887, -1.304439598), (-0.097205283, -1.303741203))
            ThreePointArc((-0.097205283, -1.303741203), (-0.043344118, -0.652015244), (-0.025390397, 0.000698395))
            Line((-0.025390397, 0.000698395), (0.000698395, 0.025390397))
            ThreePointArc((0.000698395, 0.025390397), (0.653412034, 0.007436675), (1.307113353, 0.025390397))
            Line((1.307113353, 0.025390397), (1.306414958, 0))
        make_face()
    chamfer1_piece_15a = extrude(amount=140.426037395, mode=Mode.PRIVATE)
    chamfer1_piece_15a = split(chamfer1_piece_15a, bisect_by=Plane(origin=(52.509062384, -68.58, 5.461731684), z_dir=(0, -1, 0)), keep=Keep.TOP, mode=Mode.PRIVATE)
    chamfer1_piece_15a = split(chamfer1_piece_15a, bisect_by=Plane(origin=(52.509062384, -70.213018697, 4.826), z_dir=(0, 0, 1)), keep=Keep.TOP, mode=Mode.PRIVATE)
    with BuildSketch(Plane(origin=(55.336037395, -68.58, 5.842), x_dir=(0, -0.9996219169112968, 0.02749587661058659), z_dir=(-1, 0, 0))) as chamfer1_piece_15b_section:
        with BuildLine():
            Line((1.306414958, 0), (-0.071814887, -1.304439598))
            Line((-0.071814887, -1.304439598), (-0.097205283, -1.303741203))
            ThreePointArc((-0.097205283, -1.303741203), (-0.043344118, -0.652015244), (-0.025390397, 0.000698395))
            Line((-0.025390397, 0.000698395), (0.000698395, 0.025390397))
            ThreePointArc((0.000698395, 0.025390397), (0.653412034, 0.007436675), (1.307113353, 0.025390397))
            Line((1.307113353, 0.025390397), (1.306414958, 0))
        make_face()
    chamfer1_piece_15b = extrude(amount=107.406037395, mode=Mode.PRIVATE)
    chamfer1_piece_15b = split(chamfer1_piece_15b, bisect_by=Plane(origin=(52.07, -69.019062384, 5.461731684), z_dir=(1, 0, 0)), keep=Keep.TOP, mode=Mode.PRIVATE)
    chamfer1_piece_15b = split(chamfer1_piece_15b, bisect_by=Plane(origin=(53.703018697, -69.019062384, 4.826), z_dir=(0, 0, 1)), keep=Keep.TOP, mode=Mode.PRIVATE)
    chamfer1_piece_15 = chamfer1_piece_15a & chamfer1_piece_15b
    add(chamfer1_piece_15, mode=Mode.SUBTRACT)
    with BuildSketch(Plane(origin=(52.07, -68.58, 5.842), x_dir=(0, -0.9996219169112968, 0.02749587661058659), z_dir=(-1, 0, 0))) as chamfer1_piece_16a_section:
        with BuildLine():
            Line((1.306414958, 0), (-0.071814887, -1.304439598))
            Line((-0.071814887, -1.304439598), (-0.097205283, -1.303741203))
            ThreePointArc((-0.097205283, -1.303741203), (-0.043344118, -0.652015244), (-0.025390397, 0.000698395))
            Line((-0.025390397, 0.000698395), (0.000698395, 0.025390397))
            ThreePointArc((0.000698395, 0.025390397), (0.653412034, 0.007436675), (1.307113353, 0.025390397))
            Line((1.307113353, 0.025390397), (1.306414958, 0))
        make_face()
    chamfer1_piece_16a = extrude(amount=107.406037395, mode=Mode.PRIVATE)
    chamfer1_piece_16a = split(chamfer1_piece_16a, bisect_by=Plane(origin=(-52.07, -69.019062384, 5.461731684), z_dir=(-1, 0, 0)), keep=Keep.TOP, mode=Mode.PRIVATE)
    chamfer1_piece_16a = split(chamfer1_piece_16a, bisect_by=Plane(origin=(-53.703018697, -69.019062384, 4.826), z_dir=(0, 0, 1)), keep=Keep.TOP, mode=Mode.PRIVATE)
    with BuildSketch(Plane(origin=(-52.07, -71.846037395, 5.842), x_dir=(-0.9996219169112968, 0, 0.02749587661058659), z_dir=(0, 1, 0))) as chamfer1_piece_16b_section:
        with BuildLine():
            Line((1.306414958, 0), (-0.071814887, -1.304439598))
            Line((-0.071814887, -1.304439598), (-0.097205283, -1.303741203))
            ThreePointArc((-0.097205283, -1.303741203), (-0.043344118, -0.652015244), (-0.025390397, 0.000698395))
            Line((-0.025390397, 0.000698395), (0.000698395, 0.025390397))
            ThreePointArc((0.000698395, 0.025390397), (0.653412034, 0.007436675), (1.307113353, 0.025390397))
            Line((1.307113353, 0.025390397), (1.306414958, 0))
        make_face()
    chamfer1_piece_16b = extrude(amount=140.426037395, mode=Mode.PRIVATE)
    chamfer1_piece_16b = split(chamfer1_piece_16b, bisect_by=Plane(origin=(-52.509062384, -68.58, 5.461731684), z_dir=(0, -1, 0)), keep=Keep.TOP, mode=Mode.PRIVATE)
    chamfer1_piece_16b = split(chamfer1_piece_16b, bisect_by=Plane(origin=(-52.509062384, -70.213018697, 4.826), z_dir=(0, 0, 1)), keep=Keep.TOP, mode=Mode.PRIVATE)
    chamfer1_piece_16 = chamfer1_piece_16a & chamfer1_piece_16b
    add(chamfer1_piece_16, mode=Mode.SUBTRACT)

    # Chamfer2: one chamfer whose edges measure the first distance from different faces: ONE call of the kernel's chamfer builder (chamfer() names one face for all edges)
    chamfer2_edges_1 = [part.edges().sort_by_distance(p)[0] for p in [
        (-56.634948889, 75.944445614, 2.921),
    ]]
    chamfer2_side_1 = [part.faces().sort_by_distance(p)[0] for p in [
        (0, 75.945220304, 2.912145254),
    ]]
    chamfer2_edges_2 = [part.edges().sort_by_distance(p)[0] for p in [
        (56.634948889, 75.944445614, 2.921),
    ]]
    chamfer2_side_2 = [part.faces().sort_by_distance(p)[0] for p in [
        (56.635526608, 0, 2.917723595),
    ]]
    chamfer2_edges_3 = [part.edges().sort_by_distance(p)[0] for p in [
        (56.634948889, -75.944445614, 2.921),
    ]]
    chamfer2_side_3 = [part.faces().sort_by_distance(p)[0] for p in [
        (0, -75.945220304, 2.912145254),
    ]]
    chamfer2_edges_4 = [part.edges().sort_by_distance(p)[0] for p in [
        (-56.634948889, -75.944445614, 2.921),
    ]]
    chamfer2_side_4 = [part.faces().sort_by_distance(p)[0] for p in [
        (-56.635526608, 0, 2.917723595),
    ]]
    chamfer2 = BRepFilletAPI_MakeChamfer(part.part.solid().wrapped)
    for e in chamfer2_edges_1:
        chamfer2.Add(CHAMFER2_SIZE, CHAMFER2_SIZE2, e.wrapped, chamfer2_side_1[0].wrapped)  # the first distance lies on this face
    for e in chamfer2_edges_2:
        chamfer2.Add(CHAMFER2_SIZE, CHAMFER2_SIZE2, e.wrapped, chamfer2_side_2[0].wrapped)  # the first distance lies on this face
    for e in chamfer2_edges_3:
        chamfer2.Add(CHAMFER2_SIZE, CHAMFER2_SIZE2, e.wrapped, chamfer2_side_3[0].wrapped)  # the first distance lies on this face
    for e in chamfer2_edges_4:
        chamfer2.Add(CHAMFER2_SIZE, CHAMFER2_SIZE2, e.wrapped, chamfer2_side_4[0].wrapped)  # the first distance lies on this face
    add(Compound.cast(chamfer2.Shape()), mode=Mode.REPLACE)

    # Sketch3 → Cut-Extrude1 (cut)
    with BuildSketch(Plane.XY.offset(5.842)):
        with BuildLine():
            Line((15.875, 55.88), (-15.875, 55.88))
            ThreePointArc((-15.875, 55.88), (-19.05, 59.055), (-15.875, 62.23))
            Line((-15.875, 62.23), (15.875, 62.23))
            ThreePointArc((15.875, 62.23), (19.05, 59.055), (15.875, 55.88))
        make_face()
        with BuildLine():
            Line((15.875, 44.45), (-15.875, 44.45))
            ThreePointArc((-15.875, 44.45), (-19.05, 47.625), (-15.875, 50.8))
            Line((-15.875, 50.8), (15.875, 50.8))
            ThreePointArc((15.875, 50.8), (19.05, 47.625), (15.875, 44.45))
        make_face()
        with BuildLine():
            Line((15.875, 33.02), (-15.875, 33.02))
            ThreePointArc((-15.875, 33.02), (-19.05, 36.195), (-15.875, 39.37))
            Line((-15.875, 39.37), (15.875, 39.37))
            ThreePointArc((15.875, 39.37), (19.05, 36.195), (15.875, 33.02))
        make_face()
    extrude(amount=-CUT_EXTRUDE1_DEPTH, mode=Mode.SUBTRACT)


solid = part.part
